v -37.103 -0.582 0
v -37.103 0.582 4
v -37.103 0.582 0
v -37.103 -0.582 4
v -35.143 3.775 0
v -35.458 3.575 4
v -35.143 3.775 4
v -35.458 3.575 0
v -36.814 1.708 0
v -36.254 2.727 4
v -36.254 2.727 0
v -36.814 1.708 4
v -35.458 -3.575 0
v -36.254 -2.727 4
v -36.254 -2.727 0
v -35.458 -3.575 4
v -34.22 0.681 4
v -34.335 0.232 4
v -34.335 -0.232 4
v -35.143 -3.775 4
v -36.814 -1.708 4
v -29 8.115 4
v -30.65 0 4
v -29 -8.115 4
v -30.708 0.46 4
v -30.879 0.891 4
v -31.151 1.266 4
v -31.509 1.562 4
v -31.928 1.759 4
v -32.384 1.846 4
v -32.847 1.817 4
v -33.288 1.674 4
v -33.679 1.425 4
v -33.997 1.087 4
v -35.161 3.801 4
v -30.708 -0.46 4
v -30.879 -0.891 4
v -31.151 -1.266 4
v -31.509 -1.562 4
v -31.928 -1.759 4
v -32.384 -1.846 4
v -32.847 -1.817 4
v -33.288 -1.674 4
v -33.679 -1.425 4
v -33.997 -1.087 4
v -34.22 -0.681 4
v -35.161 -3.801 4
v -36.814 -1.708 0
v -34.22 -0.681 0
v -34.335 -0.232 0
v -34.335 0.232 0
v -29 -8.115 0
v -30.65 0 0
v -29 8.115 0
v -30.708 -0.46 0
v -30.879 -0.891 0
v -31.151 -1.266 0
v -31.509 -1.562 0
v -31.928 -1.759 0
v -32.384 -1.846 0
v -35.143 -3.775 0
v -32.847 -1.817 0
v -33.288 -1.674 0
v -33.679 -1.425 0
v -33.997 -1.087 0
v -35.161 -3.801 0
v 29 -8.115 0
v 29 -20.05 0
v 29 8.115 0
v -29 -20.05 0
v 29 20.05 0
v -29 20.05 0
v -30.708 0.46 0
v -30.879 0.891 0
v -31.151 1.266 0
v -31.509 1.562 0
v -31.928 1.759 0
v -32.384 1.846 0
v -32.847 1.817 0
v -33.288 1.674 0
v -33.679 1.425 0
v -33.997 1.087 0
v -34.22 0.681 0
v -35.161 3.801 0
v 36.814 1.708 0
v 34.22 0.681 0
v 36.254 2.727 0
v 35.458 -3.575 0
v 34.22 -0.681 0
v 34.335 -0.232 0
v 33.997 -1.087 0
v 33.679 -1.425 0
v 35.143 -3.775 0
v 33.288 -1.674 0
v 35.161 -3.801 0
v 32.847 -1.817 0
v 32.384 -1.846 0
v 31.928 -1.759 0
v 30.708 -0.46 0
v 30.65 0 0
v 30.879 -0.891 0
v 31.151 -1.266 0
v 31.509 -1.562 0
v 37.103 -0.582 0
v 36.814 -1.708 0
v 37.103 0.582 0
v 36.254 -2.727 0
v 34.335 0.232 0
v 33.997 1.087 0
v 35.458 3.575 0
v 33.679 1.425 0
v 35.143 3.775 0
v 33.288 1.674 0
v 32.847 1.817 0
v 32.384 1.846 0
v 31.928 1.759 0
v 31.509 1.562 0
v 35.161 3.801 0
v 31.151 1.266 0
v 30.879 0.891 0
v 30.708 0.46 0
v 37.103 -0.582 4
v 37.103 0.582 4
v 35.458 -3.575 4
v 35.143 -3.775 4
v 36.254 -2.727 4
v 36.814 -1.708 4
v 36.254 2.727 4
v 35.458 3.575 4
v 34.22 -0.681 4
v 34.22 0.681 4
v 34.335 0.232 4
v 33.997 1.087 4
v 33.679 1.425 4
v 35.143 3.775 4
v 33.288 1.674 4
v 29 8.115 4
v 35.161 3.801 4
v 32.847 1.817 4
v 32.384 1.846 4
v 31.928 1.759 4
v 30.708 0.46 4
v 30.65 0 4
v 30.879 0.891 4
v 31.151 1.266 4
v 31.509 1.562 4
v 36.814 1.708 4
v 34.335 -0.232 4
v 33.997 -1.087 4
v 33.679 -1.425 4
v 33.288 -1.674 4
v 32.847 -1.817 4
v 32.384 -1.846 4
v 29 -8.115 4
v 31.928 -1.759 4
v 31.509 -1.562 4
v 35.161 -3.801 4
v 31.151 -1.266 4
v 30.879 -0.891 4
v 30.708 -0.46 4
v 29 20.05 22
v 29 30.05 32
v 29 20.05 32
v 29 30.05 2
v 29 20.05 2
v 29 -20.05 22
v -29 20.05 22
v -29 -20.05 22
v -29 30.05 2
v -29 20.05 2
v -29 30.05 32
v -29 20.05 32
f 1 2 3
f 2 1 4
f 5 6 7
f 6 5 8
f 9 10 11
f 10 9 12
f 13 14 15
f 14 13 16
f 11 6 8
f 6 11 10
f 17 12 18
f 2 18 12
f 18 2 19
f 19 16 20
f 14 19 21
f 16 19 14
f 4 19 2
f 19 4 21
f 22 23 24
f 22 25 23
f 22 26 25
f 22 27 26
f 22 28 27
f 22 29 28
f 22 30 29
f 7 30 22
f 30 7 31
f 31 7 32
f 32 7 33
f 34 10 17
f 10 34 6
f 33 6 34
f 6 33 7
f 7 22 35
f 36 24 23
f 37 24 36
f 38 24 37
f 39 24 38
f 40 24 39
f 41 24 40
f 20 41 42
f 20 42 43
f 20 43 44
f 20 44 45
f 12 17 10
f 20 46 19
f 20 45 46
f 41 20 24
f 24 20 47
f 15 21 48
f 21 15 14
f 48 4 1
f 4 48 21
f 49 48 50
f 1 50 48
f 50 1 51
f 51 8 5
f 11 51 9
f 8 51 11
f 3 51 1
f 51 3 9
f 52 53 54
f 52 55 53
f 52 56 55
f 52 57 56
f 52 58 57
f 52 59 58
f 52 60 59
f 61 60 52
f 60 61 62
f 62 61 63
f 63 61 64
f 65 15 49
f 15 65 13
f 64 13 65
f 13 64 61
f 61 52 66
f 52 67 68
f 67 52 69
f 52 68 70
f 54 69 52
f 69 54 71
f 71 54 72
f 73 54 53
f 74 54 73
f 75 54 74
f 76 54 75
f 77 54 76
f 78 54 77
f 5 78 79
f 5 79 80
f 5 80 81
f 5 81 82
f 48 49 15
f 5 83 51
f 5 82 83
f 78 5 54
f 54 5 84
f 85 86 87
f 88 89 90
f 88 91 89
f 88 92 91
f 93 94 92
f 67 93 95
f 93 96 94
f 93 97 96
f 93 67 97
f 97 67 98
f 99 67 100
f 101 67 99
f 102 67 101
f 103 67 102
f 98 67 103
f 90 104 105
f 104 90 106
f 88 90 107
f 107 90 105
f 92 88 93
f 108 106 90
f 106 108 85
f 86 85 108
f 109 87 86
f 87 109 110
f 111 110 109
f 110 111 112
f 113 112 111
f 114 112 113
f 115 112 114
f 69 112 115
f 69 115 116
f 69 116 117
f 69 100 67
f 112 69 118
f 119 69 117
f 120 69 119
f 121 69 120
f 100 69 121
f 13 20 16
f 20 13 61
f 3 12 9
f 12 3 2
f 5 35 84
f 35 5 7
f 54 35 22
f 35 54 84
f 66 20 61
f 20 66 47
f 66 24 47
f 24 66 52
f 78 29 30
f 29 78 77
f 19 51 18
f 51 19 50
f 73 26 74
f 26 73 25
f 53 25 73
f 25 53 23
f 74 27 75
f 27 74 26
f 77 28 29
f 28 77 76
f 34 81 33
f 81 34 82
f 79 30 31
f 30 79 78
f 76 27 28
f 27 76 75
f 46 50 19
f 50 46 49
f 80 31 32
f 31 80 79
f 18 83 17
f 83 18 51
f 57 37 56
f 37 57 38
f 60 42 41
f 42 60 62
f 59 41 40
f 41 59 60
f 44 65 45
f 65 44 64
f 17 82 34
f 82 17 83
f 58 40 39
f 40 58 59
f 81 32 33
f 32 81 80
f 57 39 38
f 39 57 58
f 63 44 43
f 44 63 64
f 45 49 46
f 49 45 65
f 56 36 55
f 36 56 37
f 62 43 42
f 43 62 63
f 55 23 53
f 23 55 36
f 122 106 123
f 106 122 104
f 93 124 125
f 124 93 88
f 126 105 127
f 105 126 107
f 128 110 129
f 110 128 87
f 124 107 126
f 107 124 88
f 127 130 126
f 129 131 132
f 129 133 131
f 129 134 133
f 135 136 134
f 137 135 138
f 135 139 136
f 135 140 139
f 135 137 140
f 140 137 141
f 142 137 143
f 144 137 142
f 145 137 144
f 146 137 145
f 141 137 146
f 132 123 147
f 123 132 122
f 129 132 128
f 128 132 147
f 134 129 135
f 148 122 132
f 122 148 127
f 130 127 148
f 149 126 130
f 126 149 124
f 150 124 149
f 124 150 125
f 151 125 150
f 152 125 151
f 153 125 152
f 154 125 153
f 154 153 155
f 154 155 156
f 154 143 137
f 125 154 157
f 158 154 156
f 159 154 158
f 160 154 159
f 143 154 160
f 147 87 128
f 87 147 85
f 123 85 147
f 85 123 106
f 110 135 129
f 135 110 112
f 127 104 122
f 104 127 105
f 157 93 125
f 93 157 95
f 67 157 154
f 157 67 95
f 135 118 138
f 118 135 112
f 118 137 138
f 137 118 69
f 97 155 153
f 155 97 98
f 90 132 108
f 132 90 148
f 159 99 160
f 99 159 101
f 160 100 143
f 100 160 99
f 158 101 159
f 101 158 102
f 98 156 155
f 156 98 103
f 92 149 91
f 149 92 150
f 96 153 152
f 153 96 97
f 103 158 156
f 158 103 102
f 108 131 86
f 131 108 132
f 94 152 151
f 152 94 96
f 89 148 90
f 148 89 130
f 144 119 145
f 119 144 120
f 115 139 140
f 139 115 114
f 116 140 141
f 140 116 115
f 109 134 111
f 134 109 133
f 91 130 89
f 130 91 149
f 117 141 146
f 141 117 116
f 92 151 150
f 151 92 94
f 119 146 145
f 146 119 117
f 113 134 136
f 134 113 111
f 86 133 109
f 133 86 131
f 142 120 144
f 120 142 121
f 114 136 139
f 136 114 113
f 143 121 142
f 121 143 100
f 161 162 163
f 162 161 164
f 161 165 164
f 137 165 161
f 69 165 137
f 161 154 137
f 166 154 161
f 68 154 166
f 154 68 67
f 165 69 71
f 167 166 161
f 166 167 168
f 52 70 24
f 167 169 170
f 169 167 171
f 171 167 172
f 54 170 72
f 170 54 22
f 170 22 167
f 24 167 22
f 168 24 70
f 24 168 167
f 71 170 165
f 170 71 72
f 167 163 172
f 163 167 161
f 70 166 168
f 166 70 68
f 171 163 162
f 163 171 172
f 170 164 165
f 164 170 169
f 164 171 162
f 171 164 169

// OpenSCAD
wall_thickness = 2;

outer_dim_x = 58;
outer_dim_y = 40.1;
outer_dim_z = 22;

screwhole_offset_from_center = 65/2;
screwhole_diameter = 3.7;
screw_holder_radius = 4.64;
screw_holder_z = 4;
screw_holder_angle = 35;

module dcdc_converter()
{
    translate([-outer_dim_x/2,-outer_dim_y/2,0]) cube([outer_dim_x, outer_dim_y, outer_dim_z]);

    //screw_holder(screwhole_offset_from_center);
    translate([-screwhole_offset_from_center,0,0]) screw_holder();
    translate([screwhole_offset_from_center,0,0]) rotate([0,0,180]) screw_holder();
    
    wire_channel();
}

module wire_channel()
{
    wire_bend_x = outer_dim_x;
    wire_bend_y = 10;
    wire_bend_z = outer_dim_z - wall_thickness;
    wire_bend_z_offset = outer_dim_z-wire_bend_z;
    wire_bend_z_overhang = 10;
    
    //allow for wire bend radius
    translate([0,outer_dim_y/2+wire_bend_y/2,wire_bend_z_offset+(wire_bend_z+wire_bend_z_overhang)/2]) cube([wire_bend_x, wire_bend_y, wire_bend_z + wire_bend_z_overhang], center=true);
}

module screw_holder()
{
    difference()
    {
        union()
        {
            //flange
            translate([0,0,0]) cylinder(h=screw_holder_z, r=screw_holder_radius, $fn=25);
             
            //angled flange edge
            translate([0,0,0]) 
            rotate([0,0,screw_holder_angle]) cube([screw_holder_radius*2,screw_holder_radius,screw_holder_z]);
            translate([0,0,0]) rotate([0,0,-screw_holder_angle]) translate([0,-screw_holder_radius,0]) cube([screw_holder_radius*2,screw_holder_radius,screw_holder_z]);
        }
        
        //hole
        translate([0,0,-0.1]) cylinder(h=screw_holder_z+0.2, d=screwhole_diameter, $fn=25);
    }
}

dcdc_converter();
